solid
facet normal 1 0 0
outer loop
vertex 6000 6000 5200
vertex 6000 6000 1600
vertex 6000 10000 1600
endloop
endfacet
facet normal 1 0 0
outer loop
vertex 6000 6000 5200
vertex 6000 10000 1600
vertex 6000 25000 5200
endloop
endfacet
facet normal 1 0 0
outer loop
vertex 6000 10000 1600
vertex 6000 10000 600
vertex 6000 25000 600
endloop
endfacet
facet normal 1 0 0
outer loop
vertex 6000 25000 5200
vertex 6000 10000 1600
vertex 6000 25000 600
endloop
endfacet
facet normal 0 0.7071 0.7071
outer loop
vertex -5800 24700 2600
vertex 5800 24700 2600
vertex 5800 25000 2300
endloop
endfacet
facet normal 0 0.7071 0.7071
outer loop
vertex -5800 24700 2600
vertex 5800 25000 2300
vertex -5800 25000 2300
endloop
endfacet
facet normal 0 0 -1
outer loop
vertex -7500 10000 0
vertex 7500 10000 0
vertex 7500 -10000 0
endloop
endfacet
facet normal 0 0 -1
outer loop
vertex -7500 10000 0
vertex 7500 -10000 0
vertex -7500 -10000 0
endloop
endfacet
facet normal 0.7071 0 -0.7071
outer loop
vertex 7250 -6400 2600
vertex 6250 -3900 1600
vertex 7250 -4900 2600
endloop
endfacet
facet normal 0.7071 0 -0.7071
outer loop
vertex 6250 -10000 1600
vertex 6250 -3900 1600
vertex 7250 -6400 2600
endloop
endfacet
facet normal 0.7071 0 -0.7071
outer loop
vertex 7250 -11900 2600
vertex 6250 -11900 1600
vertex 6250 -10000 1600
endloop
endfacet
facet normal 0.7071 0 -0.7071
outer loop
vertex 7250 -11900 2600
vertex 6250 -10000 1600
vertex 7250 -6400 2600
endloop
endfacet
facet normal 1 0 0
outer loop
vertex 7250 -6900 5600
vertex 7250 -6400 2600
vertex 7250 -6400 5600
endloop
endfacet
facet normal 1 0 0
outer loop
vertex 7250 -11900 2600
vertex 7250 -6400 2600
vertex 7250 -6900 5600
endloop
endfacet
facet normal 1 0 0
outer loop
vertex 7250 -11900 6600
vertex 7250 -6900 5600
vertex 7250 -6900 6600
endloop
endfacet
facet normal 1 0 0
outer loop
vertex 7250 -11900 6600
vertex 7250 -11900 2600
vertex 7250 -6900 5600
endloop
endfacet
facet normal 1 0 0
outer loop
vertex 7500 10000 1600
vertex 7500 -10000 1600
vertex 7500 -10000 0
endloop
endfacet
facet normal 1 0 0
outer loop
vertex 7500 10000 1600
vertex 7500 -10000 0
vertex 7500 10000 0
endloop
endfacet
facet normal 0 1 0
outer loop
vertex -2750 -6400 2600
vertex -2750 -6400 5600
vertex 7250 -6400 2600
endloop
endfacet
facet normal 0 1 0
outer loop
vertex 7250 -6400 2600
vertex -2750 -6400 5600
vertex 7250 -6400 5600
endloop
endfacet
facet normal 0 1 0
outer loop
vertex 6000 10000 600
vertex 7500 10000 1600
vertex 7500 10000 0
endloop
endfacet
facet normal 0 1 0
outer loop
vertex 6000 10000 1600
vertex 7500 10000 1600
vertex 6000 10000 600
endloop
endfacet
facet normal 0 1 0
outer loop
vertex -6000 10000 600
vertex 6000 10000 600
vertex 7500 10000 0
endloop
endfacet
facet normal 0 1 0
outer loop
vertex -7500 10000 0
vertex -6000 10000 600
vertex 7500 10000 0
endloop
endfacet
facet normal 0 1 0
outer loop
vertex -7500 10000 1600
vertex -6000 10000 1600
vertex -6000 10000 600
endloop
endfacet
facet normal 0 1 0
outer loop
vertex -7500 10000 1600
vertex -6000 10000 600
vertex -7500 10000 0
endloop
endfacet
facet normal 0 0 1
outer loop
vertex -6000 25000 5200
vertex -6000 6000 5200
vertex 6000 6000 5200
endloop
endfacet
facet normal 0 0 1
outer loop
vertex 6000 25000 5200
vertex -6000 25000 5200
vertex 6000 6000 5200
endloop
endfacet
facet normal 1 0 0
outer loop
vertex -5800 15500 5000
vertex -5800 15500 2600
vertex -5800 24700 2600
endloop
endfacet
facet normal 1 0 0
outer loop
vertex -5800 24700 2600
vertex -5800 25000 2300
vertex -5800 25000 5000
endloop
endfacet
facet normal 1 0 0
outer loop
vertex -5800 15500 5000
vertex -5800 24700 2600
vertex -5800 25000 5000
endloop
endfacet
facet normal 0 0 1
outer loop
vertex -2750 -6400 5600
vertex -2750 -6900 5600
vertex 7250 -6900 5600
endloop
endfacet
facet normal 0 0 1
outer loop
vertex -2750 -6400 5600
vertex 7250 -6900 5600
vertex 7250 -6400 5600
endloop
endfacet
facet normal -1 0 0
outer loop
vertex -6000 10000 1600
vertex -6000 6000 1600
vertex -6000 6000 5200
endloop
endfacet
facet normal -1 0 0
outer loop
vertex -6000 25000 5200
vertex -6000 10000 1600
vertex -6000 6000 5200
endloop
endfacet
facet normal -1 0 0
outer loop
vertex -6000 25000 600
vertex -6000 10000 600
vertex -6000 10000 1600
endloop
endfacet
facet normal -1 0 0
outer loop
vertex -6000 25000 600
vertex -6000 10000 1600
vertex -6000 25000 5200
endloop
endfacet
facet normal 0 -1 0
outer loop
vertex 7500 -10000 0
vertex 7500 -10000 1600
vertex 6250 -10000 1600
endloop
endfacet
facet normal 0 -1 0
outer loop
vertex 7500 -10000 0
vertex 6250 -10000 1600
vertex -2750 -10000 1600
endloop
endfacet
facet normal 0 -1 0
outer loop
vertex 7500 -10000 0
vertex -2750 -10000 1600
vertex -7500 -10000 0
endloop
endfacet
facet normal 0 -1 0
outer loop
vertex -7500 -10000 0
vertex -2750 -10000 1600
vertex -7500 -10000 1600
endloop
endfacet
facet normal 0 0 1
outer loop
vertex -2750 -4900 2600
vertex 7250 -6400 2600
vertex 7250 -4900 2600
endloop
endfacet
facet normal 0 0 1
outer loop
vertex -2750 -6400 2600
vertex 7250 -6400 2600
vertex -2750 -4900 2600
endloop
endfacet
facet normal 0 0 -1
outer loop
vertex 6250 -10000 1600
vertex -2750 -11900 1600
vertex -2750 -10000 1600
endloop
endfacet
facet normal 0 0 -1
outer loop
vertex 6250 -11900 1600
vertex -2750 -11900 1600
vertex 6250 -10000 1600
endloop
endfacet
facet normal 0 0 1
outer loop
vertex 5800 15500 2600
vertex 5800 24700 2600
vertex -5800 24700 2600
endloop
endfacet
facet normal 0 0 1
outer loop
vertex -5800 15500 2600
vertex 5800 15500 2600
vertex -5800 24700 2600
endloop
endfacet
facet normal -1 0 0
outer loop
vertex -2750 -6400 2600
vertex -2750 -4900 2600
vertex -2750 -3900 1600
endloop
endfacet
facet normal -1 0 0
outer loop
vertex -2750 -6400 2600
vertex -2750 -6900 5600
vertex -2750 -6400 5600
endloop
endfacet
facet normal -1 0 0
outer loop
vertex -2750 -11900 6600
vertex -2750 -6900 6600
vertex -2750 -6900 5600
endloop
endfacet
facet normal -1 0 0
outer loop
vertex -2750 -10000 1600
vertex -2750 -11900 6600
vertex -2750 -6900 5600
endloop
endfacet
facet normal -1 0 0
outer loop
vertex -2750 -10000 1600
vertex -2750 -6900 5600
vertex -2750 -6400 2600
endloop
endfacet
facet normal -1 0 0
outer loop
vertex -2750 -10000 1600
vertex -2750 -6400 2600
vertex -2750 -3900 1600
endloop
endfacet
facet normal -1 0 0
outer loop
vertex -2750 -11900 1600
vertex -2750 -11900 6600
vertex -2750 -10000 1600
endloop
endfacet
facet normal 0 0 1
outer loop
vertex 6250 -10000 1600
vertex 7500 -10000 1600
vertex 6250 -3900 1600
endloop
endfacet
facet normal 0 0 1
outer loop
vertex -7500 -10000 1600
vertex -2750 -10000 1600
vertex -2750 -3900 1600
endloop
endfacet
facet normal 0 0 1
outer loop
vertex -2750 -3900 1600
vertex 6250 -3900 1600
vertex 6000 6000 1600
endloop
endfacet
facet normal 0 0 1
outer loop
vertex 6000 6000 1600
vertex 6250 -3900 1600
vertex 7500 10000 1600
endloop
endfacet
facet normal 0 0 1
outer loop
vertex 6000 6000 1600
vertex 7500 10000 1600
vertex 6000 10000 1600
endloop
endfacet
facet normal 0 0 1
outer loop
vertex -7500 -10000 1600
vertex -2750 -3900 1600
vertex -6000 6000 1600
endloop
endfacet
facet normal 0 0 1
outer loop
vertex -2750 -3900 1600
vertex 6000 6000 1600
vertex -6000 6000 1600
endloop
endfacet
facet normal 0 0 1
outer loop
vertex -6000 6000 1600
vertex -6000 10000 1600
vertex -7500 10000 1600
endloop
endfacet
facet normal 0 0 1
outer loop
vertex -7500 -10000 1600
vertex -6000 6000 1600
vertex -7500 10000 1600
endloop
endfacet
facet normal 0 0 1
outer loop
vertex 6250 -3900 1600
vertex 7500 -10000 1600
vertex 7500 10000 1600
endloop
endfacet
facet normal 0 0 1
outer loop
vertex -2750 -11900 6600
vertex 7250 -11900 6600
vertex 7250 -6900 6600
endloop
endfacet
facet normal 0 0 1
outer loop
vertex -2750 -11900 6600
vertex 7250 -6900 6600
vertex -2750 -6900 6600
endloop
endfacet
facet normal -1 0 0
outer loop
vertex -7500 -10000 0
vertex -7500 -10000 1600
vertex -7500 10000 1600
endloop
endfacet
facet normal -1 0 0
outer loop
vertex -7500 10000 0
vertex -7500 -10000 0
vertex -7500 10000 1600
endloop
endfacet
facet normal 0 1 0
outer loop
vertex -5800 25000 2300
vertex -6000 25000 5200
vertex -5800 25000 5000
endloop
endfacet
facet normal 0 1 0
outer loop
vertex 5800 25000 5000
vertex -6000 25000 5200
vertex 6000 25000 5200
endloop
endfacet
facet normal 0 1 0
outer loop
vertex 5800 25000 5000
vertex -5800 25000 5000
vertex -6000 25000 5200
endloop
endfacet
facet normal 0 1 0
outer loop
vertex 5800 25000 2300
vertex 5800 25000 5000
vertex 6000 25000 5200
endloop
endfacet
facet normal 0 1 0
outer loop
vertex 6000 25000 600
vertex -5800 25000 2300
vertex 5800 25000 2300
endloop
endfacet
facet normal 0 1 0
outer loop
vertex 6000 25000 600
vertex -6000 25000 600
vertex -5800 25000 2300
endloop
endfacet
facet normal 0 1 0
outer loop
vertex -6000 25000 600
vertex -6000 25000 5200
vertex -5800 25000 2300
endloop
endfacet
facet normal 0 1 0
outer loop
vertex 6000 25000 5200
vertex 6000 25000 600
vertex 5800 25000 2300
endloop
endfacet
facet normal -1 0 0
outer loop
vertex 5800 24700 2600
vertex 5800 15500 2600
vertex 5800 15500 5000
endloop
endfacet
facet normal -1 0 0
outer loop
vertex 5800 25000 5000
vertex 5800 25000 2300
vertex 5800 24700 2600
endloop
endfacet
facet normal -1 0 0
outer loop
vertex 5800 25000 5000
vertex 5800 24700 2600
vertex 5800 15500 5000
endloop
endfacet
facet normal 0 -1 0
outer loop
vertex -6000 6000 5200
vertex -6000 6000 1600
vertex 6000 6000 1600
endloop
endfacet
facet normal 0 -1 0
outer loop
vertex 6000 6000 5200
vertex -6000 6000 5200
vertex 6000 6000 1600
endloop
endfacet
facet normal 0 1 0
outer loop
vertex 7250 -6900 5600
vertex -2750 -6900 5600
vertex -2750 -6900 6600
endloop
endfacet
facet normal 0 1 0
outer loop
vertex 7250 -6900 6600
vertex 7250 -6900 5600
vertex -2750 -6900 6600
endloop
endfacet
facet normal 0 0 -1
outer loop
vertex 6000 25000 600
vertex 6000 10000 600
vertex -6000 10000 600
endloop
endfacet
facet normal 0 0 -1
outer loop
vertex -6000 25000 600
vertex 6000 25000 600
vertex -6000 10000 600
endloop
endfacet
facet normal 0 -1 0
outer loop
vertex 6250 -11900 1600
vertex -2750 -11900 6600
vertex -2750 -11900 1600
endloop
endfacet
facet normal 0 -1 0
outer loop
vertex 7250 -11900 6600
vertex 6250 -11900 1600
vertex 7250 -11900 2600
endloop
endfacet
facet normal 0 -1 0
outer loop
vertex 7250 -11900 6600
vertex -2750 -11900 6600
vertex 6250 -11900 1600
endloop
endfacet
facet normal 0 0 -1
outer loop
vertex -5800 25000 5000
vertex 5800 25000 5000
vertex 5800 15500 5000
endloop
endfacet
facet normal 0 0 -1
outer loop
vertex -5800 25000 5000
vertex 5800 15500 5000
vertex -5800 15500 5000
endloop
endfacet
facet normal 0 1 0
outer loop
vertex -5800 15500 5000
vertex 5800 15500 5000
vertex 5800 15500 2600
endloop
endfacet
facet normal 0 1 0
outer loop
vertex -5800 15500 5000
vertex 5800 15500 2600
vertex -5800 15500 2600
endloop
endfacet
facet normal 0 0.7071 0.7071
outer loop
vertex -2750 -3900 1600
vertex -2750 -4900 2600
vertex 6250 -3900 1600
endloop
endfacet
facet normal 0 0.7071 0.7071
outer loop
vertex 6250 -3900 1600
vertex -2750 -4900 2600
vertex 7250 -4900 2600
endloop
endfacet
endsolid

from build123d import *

# Parameters (mm, degrees)
BOSS_EXTRUDE1_DEPTH = 5500
BOSS_EXTRUDE2_DEPTH = 2500
SKETCH3_W           = 15000
SKETCH3_H           = 20000
BOSS_EXTRUDE3_DEPTH = 1600
SKETCH4_W           = 12000
SKETCH4_H           = 1000
BOSS_EXTRUDE4_DEPTH = 15000
SKETCH5_W           = 12000
SKETCH5_H           = 19000
BOSS_EXTRUDE5_DEPTH = 3600
SKETCH6_W           = 1000
SKETCH6_H           = 500
CUT_EXTRUDE1_DEPTH  = 27815.070180396
SKETCH7_W           = 11600
SKETCH7_H           = 2400
CUT_EXTRUDE2_DEPTH  = 9500
DRAFT1_ANGLE        = 45
CHAMFER1_SIZE       = 300


with BuildPart() as part:
    # Sketch1 → Boss-Extrude1 (new body)
    with BuildSketch(Plane.XZ.offset(11900)):
        Polygon((6250, 1600), (7250, 2600), (7250, 6600), (-2750, 6600), (-2750, 1600), align=None)
    extrude(amount=-BOSS_EXTRUDE1_DEPTH)

    # Sketch2 → Boss-Extrude2 (add)
    with BuildSketch(Plane(origin=(0, -6400, 0), x_dir=(-1, 0, 0), z_dir=(0, 1, 0))):
        Polygon((2750, 2600), (2750, 1600), (-6250, 1600), (-7250, 2600), align=None)
    extrude(amount=BOSS_EXTRUDE2_DEPTH)

    # Sketch3 → Boss-Extrude3 (add)
    with BuildSketch(Plane(origin=(0, 0, 1600), x_dir=(-1, 0, 0), z_dir=(0, 0, -1))):
        Rectangle(SKETCH3_W, SKETCH3_H)
    extrude(amount=BOSS_EXTRUDE3_DEPTH)

    # Sketch4 → Boss-Extrude4 (add)
    with BuildSketch(Plane(origin=(0, 10000, 0), x_dir=(-1, 0, 0), z_dir=(0, 1, 0))):
        with Locations((0, 1100)):
            Rectangle(SKETCH4_W, SKETCH4_H)
    extrude(amount=BOSS_EXTRUDE4_DEPTH)

    # Sketch5 → Boss-Extrude5 (add)
    with BuildSketch(Plane.XY.offset(1600)):
        with Locations((0, 15500)):
            Rectangle(SKETCH5_W, SKETCH5_H)
    extrude(amount=BOSS_EXTRUDE5_DEPTH)

    # Sketch6 → Cut-Extrude1 (cut, through all)
    with BuildSketch(Plane.ZY.offset(2750)):
        with Locations((6100, -6650)):
            Rectangle(SKETCH6_W, SKETCH6_H)
    extrude(amount=-CUT_EXTRUDE1_DEPTH, mode=Mode.SUBTRACT)

    # Sketch7 → Cut-Extrude2 (cut)
    with BuildSketch(Plane(origin=(0, 25000, 0), x_dir=(-1, 0, 0), z_dir=(0, 1, 0))):
        with Locations((0, 3800)):
            Rectangle(SKETCH7_W, SKETCH7_H)
    extrude(amount=-CUT_EXTRUDE2_DEPTH, mode=Mode.SUBTRACT)

    # Draft1
    draft1_faces = [part.faces().sort_by_distance(p)[0] for p in [
        (2004.385964912, -3900, 2108.771929825),
    ]]
    draft(draft1_faces, Plane.XY.offset(1600), DRAFT1_ANGLE)

    # Chamfer1
    chamfer1_edges = [part.edges().sort_by_distance(p)[0] for p in [
        (0, 25000, 2600),
    ]]
    chamfer(chamfer1_edges, length=CHAMFER1_SIZE)


solid = part.part
